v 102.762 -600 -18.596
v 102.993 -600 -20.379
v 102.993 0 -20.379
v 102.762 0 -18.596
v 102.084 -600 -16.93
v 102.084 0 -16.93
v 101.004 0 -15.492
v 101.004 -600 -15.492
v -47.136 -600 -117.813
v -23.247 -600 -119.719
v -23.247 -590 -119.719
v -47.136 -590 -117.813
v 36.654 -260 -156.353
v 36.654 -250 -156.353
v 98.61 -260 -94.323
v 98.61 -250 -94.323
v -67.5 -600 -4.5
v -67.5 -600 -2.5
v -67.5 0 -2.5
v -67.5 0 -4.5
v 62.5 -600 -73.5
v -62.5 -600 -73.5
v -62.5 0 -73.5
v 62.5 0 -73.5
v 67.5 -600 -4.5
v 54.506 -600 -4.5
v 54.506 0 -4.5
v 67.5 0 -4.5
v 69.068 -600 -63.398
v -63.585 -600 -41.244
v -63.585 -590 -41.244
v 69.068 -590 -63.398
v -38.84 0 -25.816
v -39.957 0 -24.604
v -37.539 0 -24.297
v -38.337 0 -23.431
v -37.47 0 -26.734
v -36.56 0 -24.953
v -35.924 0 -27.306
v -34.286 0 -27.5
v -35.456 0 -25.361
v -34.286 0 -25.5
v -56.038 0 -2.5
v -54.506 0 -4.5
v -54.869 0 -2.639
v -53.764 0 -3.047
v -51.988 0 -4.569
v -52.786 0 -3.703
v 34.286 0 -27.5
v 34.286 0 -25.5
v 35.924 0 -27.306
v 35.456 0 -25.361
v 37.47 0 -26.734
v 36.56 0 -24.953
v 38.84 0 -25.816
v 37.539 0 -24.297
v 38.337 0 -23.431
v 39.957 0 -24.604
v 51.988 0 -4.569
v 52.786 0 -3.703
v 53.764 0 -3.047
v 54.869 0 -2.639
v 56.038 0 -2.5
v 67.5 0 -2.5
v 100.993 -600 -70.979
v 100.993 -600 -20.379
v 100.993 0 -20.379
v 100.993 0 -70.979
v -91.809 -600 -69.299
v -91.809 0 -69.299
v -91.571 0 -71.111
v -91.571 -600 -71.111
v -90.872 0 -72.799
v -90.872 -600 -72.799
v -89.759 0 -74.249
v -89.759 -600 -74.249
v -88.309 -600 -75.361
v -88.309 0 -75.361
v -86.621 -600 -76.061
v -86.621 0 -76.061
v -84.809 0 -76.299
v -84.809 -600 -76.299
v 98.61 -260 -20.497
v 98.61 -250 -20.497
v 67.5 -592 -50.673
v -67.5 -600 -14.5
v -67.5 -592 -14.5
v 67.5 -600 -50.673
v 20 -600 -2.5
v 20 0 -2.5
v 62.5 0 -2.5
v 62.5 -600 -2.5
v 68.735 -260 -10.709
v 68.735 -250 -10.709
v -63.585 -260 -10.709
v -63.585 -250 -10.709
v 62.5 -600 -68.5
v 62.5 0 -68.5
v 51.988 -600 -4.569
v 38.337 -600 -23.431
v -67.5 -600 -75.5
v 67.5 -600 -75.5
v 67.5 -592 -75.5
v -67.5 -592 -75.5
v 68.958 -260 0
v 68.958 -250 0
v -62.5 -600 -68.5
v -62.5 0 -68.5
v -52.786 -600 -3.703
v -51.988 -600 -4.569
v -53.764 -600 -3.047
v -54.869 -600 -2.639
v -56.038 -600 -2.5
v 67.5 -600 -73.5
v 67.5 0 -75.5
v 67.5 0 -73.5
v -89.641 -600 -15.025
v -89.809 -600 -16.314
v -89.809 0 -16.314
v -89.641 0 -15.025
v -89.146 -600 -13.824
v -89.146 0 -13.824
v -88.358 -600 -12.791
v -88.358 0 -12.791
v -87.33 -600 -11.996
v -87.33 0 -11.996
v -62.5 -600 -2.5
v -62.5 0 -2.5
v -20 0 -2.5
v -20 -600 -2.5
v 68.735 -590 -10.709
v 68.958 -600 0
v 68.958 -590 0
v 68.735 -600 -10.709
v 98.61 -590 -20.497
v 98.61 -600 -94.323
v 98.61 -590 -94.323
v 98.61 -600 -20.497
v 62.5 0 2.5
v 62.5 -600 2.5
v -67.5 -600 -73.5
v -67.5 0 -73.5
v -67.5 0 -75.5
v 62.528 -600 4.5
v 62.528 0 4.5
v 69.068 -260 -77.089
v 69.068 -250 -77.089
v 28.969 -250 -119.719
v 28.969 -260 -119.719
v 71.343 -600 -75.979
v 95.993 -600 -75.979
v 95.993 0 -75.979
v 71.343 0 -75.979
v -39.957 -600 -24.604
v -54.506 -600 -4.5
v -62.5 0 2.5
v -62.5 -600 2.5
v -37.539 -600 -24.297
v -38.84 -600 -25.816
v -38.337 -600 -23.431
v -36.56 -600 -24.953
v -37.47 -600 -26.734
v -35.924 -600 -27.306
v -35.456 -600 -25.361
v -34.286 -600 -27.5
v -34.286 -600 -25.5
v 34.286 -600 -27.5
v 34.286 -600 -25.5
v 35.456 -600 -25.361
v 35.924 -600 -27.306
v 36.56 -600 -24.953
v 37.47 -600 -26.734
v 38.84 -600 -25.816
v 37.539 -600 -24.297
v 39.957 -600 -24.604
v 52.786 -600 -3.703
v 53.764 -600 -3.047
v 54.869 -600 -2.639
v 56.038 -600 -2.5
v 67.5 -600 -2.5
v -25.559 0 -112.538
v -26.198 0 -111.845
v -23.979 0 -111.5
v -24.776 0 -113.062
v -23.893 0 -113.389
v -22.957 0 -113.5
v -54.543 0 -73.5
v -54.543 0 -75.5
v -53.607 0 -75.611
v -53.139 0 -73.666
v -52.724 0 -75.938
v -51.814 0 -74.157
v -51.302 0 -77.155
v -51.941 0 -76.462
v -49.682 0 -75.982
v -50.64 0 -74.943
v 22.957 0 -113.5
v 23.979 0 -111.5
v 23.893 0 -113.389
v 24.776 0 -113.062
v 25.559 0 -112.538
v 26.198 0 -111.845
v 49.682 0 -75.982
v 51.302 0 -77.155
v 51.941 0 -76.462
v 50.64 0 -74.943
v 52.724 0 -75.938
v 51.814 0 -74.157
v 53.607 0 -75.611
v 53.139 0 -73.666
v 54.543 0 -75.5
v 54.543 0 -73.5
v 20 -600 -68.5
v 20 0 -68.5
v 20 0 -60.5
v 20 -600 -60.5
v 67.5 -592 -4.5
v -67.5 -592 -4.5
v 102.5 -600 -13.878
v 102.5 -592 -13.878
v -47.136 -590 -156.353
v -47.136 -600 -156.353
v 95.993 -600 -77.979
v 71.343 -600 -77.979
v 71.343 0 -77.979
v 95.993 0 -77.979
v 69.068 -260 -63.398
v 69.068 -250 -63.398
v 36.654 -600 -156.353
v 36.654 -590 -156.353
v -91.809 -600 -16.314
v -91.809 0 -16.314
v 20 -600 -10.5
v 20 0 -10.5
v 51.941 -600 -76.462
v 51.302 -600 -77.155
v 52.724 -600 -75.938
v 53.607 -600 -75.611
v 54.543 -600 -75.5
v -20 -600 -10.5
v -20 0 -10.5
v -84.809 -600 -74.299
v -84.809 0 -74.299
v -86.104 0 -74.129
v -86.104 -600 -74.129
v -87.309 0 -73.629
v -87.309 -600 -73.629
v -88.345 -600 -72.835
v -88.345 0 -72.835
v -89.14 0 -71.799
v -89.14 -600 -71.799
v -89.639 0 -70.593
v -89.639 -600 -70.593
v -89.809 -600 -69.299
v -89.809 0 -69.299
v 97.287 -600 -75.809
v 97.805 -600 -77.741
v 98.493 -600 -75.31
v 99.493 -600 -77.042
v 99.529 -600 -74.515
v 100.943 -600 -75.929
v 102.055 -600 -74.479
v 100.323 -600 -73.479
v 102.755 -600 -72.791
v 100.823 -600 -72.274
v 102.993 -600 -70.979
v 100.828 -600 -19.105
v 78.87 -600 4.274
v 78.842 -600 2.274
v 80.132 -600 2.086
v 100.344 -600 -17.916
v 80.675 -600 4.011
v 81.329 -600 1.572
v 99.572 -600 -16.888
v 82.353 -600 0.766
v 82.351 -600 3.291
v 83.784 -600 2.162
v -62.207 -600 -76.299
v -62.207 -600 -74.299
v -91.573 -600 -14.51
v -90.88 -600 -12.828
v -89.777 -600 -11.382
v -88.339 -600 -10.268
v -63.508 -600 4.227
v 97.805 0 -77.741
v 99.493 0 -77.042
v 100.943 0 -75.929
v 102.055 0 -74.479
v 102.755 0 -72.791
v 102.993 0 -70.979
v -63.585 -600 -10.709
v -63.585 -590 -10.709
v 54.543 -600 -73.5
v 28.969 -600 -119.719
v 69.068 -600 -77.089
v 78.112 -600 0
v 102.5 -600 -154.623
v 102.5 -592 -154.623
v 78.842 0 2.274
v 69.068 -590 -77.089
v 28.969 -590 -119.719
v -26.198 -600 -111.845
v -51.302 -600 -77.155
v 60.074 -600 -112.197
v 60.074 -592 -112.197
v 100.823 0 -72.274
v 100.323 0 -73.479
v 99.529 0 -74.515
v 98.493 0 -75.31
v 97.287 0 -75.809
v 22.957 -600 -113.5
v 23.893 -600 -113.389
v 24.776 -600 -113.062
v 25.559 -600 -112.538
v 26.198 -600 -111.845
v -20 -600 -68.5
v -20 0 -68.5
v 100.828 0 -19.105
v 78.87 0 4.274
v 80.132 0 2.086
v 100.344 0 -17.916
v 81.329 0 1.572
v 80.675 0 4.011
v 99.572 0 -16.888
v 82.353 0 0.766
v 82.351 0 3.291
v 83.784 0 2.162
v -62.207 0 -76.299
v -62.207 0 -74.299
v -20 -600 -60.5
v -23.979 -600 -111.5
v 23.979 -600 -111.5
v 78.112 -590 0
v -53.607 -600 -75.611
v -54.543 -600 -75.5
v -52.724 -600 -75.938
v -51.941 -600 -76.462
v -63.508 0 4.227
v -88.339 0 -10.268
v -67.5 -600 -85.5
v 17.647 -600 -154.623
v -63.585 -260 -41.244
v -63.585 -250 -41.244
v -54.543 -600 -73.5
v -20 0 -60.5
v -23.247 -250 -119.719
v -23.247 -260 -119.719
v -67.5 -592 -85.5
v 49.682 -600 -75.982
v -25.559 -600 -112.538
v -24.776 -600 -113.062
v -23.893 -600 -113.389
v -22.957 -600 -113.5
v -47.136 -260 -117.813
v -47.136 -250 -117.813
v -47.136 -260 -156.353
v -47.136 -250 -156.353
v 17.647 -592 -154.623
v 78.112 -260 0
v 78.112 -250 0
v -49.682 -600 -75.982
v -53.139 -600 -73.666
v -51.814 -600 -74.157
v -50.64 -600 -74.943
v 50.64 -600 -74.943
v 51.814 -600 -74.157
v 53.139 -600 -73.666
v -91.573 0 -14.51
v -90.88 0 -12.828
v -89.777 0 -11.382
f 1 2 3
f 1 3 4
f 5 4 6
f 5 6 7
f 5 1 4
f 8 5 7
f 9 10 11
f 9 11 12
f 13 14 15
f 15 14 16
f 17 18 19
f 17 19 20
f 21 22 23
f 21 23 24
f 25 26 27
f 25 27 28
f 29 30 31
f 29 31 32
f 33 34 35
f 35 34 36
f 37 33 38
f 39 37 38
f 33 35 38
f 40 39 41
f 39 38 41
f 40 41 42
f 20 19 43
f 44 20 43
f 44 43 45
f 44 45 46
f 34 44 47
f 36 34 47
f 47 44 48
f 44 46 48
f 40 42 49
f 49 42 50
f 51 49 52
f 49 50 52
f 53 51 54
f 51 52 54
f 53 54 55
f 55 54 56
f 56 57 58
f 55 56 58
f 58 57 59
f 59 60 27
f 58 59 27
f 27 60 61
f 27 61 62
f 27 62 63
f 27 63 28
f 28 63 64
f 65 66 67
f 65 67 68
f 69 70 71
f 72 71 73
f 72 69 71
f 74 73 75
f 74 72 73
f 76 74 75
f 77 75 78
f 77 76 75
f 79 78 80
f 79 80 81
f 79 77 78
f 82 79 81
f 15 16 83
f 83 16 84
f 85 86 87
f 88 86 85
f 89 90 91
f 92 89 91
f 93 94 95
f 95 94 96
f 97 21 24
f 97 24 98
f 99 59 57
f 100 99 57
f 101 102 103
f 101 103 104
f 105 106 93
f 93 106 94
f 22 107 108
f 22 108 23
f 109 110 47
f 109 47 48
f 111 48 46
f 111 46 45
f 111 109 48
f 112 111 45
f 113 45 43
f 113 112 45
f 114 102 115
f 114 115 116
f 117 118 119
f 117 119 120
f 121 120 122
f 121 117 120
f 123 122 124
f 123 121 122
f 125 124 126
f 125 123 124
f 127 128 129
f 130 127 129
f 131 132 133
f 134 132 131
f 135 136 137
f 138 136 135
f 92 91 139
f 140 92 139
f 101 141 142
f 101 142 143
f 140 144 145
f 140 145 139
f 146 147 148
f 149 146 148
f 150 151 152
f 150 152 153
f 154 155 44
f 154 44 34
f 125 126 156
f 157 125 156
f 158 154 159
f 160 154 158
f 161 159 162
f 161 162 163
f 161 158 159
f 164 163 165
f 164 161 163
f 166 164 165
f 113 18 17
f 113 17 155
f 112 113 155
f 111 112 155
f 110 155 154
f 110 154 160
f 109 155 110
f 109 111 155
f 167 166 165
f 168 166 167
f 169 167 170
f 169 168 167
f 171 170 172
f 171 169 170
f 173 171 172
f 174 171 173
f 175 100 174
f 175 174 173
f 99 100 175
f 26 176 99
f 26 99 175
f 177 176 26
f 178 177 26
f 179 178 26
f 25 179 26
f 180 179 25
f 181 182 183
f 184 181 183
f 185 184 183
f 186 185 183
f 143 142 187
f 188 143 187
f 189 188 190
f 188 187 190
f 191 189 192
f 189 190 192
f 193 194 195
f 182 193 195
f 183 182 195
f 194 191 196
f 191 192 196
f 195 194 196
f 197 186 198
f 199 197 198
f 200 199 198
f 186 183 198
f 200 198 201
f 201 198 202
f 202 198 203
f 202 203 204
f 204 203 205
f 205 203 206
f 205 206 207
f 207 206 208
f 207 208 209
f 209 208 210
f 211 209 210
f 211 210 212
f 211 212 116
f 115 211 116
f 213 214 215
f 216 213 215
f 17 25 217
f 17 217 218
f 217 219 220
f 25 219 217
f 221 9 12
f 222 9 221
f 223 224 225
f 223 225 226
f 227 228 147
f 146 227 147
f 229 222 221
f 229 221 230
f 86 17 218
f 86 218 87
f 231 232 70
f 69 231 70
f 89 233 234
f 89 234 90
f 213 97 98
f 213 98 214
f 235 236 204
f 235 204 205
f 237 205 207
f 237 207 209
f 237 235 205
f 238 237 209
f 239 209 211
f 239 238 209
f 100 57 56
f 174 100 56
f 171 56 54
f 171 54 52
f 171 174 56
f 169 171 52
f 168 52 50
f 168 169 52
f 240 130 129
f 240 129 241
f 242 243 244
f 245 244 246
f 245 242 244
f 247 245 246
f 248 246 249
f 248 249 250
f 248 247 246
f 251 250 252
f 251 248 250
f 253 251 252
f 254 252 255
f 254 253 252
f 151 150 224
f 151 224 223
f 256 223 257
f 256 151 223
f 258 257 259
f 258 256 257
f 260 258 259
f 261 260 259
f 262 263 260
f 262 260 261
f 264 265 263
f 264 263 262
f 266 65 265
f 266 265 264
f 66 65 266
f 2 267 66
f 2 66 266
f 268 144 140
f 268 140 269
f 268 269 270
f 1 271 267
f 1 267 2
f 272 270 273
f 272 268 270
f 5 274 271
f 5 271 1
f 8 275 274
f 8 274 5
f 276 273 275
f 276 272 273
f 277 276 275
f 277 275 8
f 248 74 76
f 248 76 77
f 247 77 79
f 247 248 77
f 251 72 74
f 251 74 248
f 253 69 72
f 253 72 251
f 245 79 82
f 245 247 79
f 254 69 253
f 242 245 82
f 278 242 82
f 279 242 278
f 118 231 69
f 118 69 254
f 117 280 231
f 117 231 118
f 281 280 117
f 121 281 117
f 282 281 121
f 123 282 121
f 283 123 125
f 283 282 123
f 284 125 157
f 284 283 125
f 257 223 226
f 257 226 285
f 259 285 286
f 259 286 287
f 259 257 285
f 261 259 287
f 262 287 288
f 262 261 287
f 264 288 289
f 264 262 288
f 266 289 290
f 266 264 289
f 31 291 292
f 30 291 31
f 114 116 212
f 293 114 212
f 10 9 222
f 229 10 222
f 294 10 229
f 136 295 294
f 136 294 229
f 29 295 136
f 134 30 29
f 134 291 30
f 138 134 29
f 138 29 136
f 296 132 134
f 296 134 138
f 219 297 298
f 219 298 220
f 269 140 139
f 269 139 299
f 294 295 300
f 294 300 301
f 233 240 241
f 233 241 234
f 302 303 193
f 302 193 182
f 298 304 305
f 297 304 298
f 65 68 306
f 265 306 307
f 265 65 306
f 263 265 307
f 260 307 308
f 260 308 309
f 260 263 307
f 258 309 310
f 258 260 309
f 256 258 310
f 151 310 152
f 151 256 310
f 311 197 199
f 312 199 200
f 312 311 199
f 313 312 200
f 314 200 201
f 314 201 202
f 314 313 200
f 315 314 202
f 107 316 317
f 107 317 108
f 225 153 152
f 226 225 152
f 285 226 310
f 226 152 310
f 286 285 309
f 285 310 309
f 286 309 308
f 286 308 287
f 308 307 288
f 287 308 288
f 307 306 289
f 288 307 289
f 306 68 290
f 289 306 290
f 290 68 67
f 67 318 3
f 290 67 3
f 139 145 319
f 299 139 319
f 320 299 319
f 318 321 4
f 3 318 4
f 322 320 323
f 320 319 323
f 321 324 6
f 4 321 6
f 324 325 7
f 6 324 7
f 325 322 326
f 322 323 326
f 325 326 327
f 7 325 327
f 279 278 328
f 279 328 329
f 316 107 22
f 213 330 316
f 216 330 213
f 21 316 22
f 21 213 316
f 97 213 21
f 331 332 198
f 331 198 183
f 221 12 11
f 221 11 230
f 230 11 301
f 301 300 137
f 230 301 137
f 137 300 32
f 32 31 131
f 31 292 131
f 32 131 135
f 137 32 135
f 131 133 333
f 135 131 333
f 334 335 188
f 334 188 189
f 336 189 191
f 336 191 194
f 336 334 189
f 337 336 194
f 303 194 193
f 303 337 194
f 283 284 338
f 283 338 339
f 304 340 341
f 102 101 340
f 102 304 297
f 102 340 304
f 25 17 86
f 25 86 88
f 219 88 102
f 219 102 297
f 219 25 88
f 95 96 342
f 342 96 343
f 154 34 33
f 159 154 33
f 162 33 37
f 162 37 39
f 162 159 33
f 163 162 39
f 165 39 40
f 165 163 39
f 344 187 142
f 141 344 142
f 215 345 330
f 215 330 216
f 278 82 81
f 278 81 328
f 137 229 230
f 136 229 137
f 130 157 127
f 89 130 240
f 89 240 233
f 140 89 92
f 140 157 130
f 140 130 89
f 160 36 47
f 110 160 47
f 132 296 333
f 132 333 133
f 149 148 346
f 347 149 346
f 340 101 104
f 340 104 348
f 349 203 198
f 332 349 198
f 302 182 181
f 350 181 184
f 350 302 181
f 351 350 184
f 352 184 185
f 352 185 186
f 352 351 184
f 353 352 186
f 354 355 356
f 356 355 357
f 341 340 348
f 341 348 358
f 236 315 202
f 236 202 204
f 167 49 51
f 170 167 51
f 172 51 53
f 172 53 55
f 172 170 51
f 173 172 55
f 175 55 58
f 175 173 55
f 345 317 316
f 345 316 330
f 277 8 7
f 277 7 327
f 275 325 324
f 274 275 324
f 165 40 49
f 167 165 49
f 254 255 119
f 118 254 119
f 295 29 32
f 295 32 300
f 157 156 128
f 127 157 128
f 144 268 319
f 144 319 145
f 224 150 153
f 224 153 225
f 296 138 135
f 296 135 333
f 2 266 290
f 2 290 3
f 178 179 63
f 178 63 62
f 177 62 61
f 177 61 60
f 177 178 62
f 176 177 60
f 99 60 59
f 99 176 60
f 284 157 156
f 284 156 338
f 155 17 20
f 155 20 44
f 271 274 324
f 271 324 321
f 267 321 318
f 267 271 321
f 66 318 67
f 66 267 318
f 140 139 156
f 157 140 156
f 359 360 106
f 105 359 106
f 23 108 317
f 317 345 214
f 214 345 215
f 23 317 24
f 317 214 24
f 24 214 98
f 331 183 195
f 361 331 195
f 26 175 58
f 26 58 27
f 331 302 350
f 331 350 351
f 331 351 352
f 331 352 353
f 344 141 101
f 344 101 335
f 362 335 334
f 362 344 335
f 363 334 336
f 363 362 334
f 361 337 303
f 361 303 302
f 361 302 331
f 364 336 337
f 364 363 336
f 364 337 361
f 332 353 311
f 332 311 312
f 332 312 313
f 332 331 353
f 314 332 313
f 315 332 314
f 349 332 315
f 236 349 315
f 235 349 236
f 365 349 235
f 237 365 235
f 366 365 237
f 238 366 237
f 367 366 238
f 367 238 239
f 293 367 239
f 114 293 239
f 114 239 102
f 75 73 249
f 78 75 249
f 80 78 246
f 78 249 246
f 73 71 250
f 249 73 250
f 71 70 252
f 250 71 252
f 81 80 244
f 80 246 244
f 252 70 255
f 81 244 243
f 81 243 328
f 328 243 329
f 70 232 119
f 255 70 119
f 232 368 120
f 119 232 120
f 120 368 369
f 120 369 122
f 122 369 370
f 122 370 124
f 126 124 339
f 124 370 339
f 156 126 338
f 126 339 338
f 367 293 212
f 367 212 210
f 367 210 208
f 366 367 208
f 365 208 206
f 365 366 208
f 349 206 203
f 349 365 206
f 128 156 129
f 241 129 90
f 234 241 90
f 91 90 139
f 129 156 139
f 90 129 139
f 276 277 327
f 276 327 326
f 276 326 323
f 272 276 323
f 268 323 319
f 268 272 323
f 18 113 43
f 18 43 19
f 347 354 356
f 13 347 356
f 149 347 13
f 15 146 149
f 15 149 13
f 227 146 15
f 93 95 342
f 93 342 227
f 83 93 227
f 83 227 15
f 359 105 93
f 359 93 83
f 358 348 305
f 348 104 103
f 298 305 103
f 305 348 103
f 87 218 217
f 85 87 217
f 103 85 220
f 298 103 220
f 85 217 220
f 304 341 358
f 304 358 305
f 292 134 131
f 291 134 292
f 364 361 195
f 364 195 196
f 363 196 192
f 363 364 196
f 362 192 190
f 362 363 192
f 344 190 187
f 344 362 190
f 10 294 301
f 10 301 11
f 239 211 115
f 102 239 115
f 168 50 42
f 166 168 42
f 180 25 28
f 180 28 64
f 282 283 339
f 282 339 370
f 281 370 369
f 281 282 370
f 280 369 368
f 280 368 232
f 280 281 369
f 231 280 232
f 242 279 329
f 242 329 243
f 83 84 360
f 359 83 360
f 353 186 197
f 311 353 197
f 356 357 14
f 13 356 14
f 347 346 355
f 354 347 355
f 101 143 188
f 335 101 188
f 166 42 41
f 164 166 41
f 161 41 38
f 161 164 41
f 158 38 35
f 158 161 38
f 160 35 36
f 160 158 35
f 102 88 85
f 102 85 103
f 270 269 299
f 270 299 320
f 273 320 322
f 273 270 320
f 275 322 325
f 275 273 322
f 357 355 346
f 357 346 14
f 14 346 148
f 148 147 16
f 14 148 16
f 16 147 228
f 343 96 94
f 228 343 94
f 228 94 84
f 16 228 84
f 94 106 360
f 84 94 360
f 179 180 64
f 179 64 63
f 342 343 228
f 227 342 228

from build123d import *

# Parameters (mm, degrees)
F1_DEPTH  = 600
F2_W      = 40
F2_H      = 8
F3_DEPTH  = 600
F5_DEPTH  = 8
F7_DEPTH  = 600
F9_DEPTH  = 600
F11_DEPTH = 10
F14_DEPTH = 10
F16_DEPTH = 600
F18_DEPTH = 600


with BuildPart() as f1:
    # F0 (on Front) → F1 (new body)
    with BuildSketch(Plane.XZ):
        Polygon((62.5, -2.5), (62.5, 2.5), (-62.5, 2.5), (-62.5, -2.5), (-20, -2.5), (-20, -10.5), (20, -10.5), (20, -2.5), align=None)
    extrude(amount=F1_DEPTH)


with BuildPart() as f3:
    # F2 (on face) → F3 (new body)
    with BuildSketch(Plane.XZ.offset(600)):
        Polygon((62.5, -73.5), (62.5, -68.5), (20, -68.5), (-20, -68.5), (-62.5, -68.5), (-62.5, -73.5), align=None)
        with Locations((0, -64.5)):
            Rectangle(F2_W, F2_H)
    extrude(amount=-F3_DEPTH)


with BuildPart() as f5:
    # F4 (on face) → F5 (new body)
    with BuildSketch(Plane.XZ.offset(600)):
        Polygon((67.5, -4.5), (-67.5, -4.5), (-67.5, -14.5), (67.5, -50.6731409782), (67.5, -75.5), (-67.5, -75.5), (-67.5, -85.5), (17.6471862576, -154.6233937864), (60.0735931288, -112.1969869152), (102.5, -154.6233937864), (102.5, -13.8782217351), align=None)
    extrude(amount=-F5_DEPTH)


with BuildPart() as f7:
    # F6 (on face) → F7 (new body)
    with BuildSketch(Plane.XZ.offset(600)):
        with BuildLine():
            Line((-62.5, -73.5), (-67.5, -73.5))
            Line((-67.5, -73.5), (-67.5, -75.5))
            Line((-67.5, -75.5), (-54.5428234244, -75.5))
            ThreePointArc((-54.5428234244, -75.5), (-52.7235239113, -75.937676421), (-51.302356648, -77.1549253592))
            Line((-51.302356648, -77.1549253592), (-26.197643352, -111.8450746408))
            ThreePointArc((-26.197643352, -111.8450746408), (-24.7764760887, -113.062323579), (-22.9571765756, -113.5))
            Line((-22.9571765756, -113.5), (0, -113.5))
            Line((0, -113.5), (22.9571765756, -113.5))
            ThreePointArc((22.9571765756, -113.5), (24.7764760887, -113.062323579), (26.197643352, -111.8450746408))
            Line((26.197643352, -111.8450746408), (51.302356648, -77.1549253592))
            ThreePointArc((51.302356648, -77.1549253592), (52.7235239113, -75.937676421), (54.5428234244, -75.5))
            Line((54.5428234244, -75.5), (67.5, -75.5))
            Line((67.5, -75.5), (67.5, -73.5))
            Line((67.5, -73.5), (62.5, -73.5))
            Line((62.5, -73.5), (54.5428234244, -73.5))
            ThreePointArc((54.5428234244, -73.5), (51.8138741547, -74.1565146315), (49.6821232598, -75.9823880388))
            Line((49.6821232598, -75.9823880388), (23.9785882878, -111.5))
            Line((23.9785882878, -111.5), (0, -111.5))
            Line((0, -111.5), (-23.9785882878, -111.5))
            Line((-23.9785882878, -111.5), (-49.6821232598, -75.9823880388))
            ThreePointArc((-49.6821232598, -75.9823880388), (-51.8138741547, -74.1565146315), (-54.5428234244, -73.5))
            Line((-54.5428234244, -73.5), (-62.5, -73.5))
        make_face()
    extrude(amount=-F7_DEPTH)


with BuildPart() as f9:
    # F8 (on face) → F9 (new body)
    with BuildSketch(Plane.XZ.offset(600)):
        with BuildLine():
            Line((-56.0380938509, -2.5), (-67.5, -2.5))
            Line((-67.5, -2.5), (-67.5, -4.5))
            Line((-67.5, -4.5), (-54.5059762826, -4.5))
            Line((-54.5059762826, -4.5), (-39.9571153066, -24.6038806214))
            ThreePointArc((-39.9571153066, -24.6038806214), (-37.4700725958, -26.7340662633), (-34.2862984479, -27.5))
            Line((-34.2862984479, -27.5), (0, -27.5))
            Line((0, -27.5), (34.2862984479, -27.5))
            ThreePointArc((34.2862984479, -27.5), (37.4700725958, -26.7340662633), (39.9571153066, -24.6038806214))
            Line((39.9571153066, -24.6038806214), (54.5059762826, -4.5))
            Line((54.5059762826, -4.5), (67.5, -4.5))
            Line((67.5, -4.5), (67.5, -2.5))
            Line((67.5, -2.5), (56.0380938509, -2.5))
            ThreePointArc((56.0380938509, -2.5), (53.7639694596, -3.0470955262), (51.9875103804, -4.568656699))
            Line((51.9875103804, -4.568656699), (38.3368819184, -23.431343301))
            ThreePointArc((38.3368819184, -23.431343301), (36.5604228393, -24.9529044738), (34.2862984479, -25.5))
            Line((34.2862984479, -25.5), (0, -25.5))
            Line((0, -25.5), (-34.2862984479, -25.5))
            ThreePointArc((-34.2862984479, -25.5), (-36.5604228393, -24.9529044738), (-38.3368819184, -23.431343301))
            Line((-38.3368819184, -23.431343301), (-51.9875103804, -4.568656699))
            ThreePointArc((-51.9875103804, -4.568656699), (-53.7639694596, -3.0470955262), (-56.0380938509, -2.5))
        make_face()
    extrude(amount=-F9_DEPTH)


with BuildPart() as f11:
    # F10 (on face) → F11 (new body)
    with BuildSketch(Plane.XZ.offset(600)):
        Polygon((-63.5848790407, -41.2441077431), (69.0678358078, -63.3979870606), (69.0678358078, -77.0888211463), (28.9685007621, -119.7190688296), (-23.246947673, -119.7190688296), (-47.1364110708, -117.8128936633), (-47.1364110708, -156.352830978), (36.653718192, -156.352830978), (98.609762815, -94.3228504545), (98.609762815, -20.4974586044), (78.1123042107, 0), (68.9577640522, 0), (68.7347809, -10.709456478), (-63.5848790407, -10.709456478), align=None)
    extrude(amount=-F11_DEPTH)


with BuildPart() as f14:
    # F13 (on offset) → F14 (new body)
    with BuildSketch(Plane.XZ.offset(250)):
        Polygon((68.9577640522, 0), (68.7347809, -10.709456478), (-63.5848790407, -10.709456478), (-63.5848790407, -41.2441077431), (69.0678358078, -63.3979870606), (69.0678358078, -77.0888211463), (28.9685007621, -119.7190688296), (-23.246947673, -119.7190688296), (-47.1364110708, -117.8128936633), (-47.1364110708, -156.352830978), (36.653718192, -156.352830978), (98.609762815, -94.3228504545), (98.609762815, -20.4974586044), (78.1123042107, 0), align=None)
    extrude(amount=F14_DEPTH)


with BuildPart() as f16:
    # F15 (on face) → F16 (new body)
    with BuildSketch(Plane.XZ.offset(600)):
        with BuildLine():
            Line((62.5276616535, 4.4998086991), (62.5, 2.5))
            Line((62.5, 2.5), (78.8424637756, 2.2739485929))
            ThreePointArc((78.8424637756, 2.2739485929), (80.7472558461, 1.8682853958), (82.3525769484, 0.7656795642))
            Line((82.3525769484, 0.7656795642), (99.5723887191, -16.8882441871))
            ThreePointArc((99.5723887191, -16.8882441871), (100.624338128, -18.494866509), (100.9931214124, -20.379496906))
            Line((100.9931214124, -20.379496906), (100.9931214124, -70.9794420705))
            ThreePointArc((100.9931214124, -70.9794420705), (99.5286553184, -74.5149759764), (95.9931214124, -75.9794420705))
            Line((95.9931214124, -75.9794420705), (71.3432030433, -75.9794420705))
            Line((71.3432030433, -75.9794420705), (71.3432030433, -77.9794420705))
            Line((71.3432030433, -77.9794420705), (95.9931214124, -77.9794420705))
            ThreePointArc((95.9931214124, -77.9794420705), (100.9428688807, -75.9291895388), (102.9931214124, -70.9794420705))
            Line((102.9931214124, -70.9794420705), (102.9931214124, -20.379496906))
            ThreePointArc((102.9931214124, -20.379496906), (102.4768248142, -17.7410143502), (101.0040956417, -15.4917430995))
            Line((101.0040956417, -15.4917430995), (83.7842838711, 2.1621806518))
            ThreePointArc((83.7842838711, 2.1621806518), (81.5368343278, 3.705828816), (78.8701254291, 4.273757292))
            Line((78.8701254291, 4.273757292), (62.5276616535, 4.4998086991))
        make_face()
    extrude(amount=-F16_DEPTH)


with BuildPart() as f18:
    # F17 (on face) → F18 (new body)
    with BuildSketch(Plane.XZ.offset(600)):
        with BuildLine():
            Line((-87.3302515781, -11.9957112245), (-62.5, 2.5))
            Line((-62.5, 2.5), (-63.5083335414, 4.22721263))
            Line((-63.5083335414, 4.22721263), (-88.3385851196, -10.2684985945))
            ThreePointArc((-88.3385851196, -10.2684985945), (-90.8800096136, -12.8283570078), (-91.8094177246, -16.3137427996))
            Line((-91.8094177246, -16.3137427996), (-91.8094177246, -69.299223721))
            ThreePointArc((-91.8094177246, -69.299223721), (-89.7591651929, -74.2489711893), (-84.8094177246, -76.299223721))
            Line((-84.8094177246, -76.299223721), (-62.20677495, -76.299223721))
            Line((-62.20677495, -76.299223721), (-62.20677495, -74.299223721))
            Line((-62.20677495, -74.299223721), (-84.8094177246, -74.299223721))
            ThreePointArc((-84.8094177246, -74.299223721), (-88.3449516305, -72.834757627), (-89.8094177246, -69.299223721))
            Line((-89.8094177246, -69.299223721), (-89.8094177246, -16.3137427996))
            ThreePointArc((-89.8094177246, -16.3137427996), (-89.1455547882, -13.8241815197), (-87.3302515781, -11.9957112245))
        make_face()
    extrude(amount=-F18_DEPTH)


solid = Compound([f1.part, f3.part, f5.part, f7.part, f9.part, f11.part, f14.part, f16.part, f18.part])
